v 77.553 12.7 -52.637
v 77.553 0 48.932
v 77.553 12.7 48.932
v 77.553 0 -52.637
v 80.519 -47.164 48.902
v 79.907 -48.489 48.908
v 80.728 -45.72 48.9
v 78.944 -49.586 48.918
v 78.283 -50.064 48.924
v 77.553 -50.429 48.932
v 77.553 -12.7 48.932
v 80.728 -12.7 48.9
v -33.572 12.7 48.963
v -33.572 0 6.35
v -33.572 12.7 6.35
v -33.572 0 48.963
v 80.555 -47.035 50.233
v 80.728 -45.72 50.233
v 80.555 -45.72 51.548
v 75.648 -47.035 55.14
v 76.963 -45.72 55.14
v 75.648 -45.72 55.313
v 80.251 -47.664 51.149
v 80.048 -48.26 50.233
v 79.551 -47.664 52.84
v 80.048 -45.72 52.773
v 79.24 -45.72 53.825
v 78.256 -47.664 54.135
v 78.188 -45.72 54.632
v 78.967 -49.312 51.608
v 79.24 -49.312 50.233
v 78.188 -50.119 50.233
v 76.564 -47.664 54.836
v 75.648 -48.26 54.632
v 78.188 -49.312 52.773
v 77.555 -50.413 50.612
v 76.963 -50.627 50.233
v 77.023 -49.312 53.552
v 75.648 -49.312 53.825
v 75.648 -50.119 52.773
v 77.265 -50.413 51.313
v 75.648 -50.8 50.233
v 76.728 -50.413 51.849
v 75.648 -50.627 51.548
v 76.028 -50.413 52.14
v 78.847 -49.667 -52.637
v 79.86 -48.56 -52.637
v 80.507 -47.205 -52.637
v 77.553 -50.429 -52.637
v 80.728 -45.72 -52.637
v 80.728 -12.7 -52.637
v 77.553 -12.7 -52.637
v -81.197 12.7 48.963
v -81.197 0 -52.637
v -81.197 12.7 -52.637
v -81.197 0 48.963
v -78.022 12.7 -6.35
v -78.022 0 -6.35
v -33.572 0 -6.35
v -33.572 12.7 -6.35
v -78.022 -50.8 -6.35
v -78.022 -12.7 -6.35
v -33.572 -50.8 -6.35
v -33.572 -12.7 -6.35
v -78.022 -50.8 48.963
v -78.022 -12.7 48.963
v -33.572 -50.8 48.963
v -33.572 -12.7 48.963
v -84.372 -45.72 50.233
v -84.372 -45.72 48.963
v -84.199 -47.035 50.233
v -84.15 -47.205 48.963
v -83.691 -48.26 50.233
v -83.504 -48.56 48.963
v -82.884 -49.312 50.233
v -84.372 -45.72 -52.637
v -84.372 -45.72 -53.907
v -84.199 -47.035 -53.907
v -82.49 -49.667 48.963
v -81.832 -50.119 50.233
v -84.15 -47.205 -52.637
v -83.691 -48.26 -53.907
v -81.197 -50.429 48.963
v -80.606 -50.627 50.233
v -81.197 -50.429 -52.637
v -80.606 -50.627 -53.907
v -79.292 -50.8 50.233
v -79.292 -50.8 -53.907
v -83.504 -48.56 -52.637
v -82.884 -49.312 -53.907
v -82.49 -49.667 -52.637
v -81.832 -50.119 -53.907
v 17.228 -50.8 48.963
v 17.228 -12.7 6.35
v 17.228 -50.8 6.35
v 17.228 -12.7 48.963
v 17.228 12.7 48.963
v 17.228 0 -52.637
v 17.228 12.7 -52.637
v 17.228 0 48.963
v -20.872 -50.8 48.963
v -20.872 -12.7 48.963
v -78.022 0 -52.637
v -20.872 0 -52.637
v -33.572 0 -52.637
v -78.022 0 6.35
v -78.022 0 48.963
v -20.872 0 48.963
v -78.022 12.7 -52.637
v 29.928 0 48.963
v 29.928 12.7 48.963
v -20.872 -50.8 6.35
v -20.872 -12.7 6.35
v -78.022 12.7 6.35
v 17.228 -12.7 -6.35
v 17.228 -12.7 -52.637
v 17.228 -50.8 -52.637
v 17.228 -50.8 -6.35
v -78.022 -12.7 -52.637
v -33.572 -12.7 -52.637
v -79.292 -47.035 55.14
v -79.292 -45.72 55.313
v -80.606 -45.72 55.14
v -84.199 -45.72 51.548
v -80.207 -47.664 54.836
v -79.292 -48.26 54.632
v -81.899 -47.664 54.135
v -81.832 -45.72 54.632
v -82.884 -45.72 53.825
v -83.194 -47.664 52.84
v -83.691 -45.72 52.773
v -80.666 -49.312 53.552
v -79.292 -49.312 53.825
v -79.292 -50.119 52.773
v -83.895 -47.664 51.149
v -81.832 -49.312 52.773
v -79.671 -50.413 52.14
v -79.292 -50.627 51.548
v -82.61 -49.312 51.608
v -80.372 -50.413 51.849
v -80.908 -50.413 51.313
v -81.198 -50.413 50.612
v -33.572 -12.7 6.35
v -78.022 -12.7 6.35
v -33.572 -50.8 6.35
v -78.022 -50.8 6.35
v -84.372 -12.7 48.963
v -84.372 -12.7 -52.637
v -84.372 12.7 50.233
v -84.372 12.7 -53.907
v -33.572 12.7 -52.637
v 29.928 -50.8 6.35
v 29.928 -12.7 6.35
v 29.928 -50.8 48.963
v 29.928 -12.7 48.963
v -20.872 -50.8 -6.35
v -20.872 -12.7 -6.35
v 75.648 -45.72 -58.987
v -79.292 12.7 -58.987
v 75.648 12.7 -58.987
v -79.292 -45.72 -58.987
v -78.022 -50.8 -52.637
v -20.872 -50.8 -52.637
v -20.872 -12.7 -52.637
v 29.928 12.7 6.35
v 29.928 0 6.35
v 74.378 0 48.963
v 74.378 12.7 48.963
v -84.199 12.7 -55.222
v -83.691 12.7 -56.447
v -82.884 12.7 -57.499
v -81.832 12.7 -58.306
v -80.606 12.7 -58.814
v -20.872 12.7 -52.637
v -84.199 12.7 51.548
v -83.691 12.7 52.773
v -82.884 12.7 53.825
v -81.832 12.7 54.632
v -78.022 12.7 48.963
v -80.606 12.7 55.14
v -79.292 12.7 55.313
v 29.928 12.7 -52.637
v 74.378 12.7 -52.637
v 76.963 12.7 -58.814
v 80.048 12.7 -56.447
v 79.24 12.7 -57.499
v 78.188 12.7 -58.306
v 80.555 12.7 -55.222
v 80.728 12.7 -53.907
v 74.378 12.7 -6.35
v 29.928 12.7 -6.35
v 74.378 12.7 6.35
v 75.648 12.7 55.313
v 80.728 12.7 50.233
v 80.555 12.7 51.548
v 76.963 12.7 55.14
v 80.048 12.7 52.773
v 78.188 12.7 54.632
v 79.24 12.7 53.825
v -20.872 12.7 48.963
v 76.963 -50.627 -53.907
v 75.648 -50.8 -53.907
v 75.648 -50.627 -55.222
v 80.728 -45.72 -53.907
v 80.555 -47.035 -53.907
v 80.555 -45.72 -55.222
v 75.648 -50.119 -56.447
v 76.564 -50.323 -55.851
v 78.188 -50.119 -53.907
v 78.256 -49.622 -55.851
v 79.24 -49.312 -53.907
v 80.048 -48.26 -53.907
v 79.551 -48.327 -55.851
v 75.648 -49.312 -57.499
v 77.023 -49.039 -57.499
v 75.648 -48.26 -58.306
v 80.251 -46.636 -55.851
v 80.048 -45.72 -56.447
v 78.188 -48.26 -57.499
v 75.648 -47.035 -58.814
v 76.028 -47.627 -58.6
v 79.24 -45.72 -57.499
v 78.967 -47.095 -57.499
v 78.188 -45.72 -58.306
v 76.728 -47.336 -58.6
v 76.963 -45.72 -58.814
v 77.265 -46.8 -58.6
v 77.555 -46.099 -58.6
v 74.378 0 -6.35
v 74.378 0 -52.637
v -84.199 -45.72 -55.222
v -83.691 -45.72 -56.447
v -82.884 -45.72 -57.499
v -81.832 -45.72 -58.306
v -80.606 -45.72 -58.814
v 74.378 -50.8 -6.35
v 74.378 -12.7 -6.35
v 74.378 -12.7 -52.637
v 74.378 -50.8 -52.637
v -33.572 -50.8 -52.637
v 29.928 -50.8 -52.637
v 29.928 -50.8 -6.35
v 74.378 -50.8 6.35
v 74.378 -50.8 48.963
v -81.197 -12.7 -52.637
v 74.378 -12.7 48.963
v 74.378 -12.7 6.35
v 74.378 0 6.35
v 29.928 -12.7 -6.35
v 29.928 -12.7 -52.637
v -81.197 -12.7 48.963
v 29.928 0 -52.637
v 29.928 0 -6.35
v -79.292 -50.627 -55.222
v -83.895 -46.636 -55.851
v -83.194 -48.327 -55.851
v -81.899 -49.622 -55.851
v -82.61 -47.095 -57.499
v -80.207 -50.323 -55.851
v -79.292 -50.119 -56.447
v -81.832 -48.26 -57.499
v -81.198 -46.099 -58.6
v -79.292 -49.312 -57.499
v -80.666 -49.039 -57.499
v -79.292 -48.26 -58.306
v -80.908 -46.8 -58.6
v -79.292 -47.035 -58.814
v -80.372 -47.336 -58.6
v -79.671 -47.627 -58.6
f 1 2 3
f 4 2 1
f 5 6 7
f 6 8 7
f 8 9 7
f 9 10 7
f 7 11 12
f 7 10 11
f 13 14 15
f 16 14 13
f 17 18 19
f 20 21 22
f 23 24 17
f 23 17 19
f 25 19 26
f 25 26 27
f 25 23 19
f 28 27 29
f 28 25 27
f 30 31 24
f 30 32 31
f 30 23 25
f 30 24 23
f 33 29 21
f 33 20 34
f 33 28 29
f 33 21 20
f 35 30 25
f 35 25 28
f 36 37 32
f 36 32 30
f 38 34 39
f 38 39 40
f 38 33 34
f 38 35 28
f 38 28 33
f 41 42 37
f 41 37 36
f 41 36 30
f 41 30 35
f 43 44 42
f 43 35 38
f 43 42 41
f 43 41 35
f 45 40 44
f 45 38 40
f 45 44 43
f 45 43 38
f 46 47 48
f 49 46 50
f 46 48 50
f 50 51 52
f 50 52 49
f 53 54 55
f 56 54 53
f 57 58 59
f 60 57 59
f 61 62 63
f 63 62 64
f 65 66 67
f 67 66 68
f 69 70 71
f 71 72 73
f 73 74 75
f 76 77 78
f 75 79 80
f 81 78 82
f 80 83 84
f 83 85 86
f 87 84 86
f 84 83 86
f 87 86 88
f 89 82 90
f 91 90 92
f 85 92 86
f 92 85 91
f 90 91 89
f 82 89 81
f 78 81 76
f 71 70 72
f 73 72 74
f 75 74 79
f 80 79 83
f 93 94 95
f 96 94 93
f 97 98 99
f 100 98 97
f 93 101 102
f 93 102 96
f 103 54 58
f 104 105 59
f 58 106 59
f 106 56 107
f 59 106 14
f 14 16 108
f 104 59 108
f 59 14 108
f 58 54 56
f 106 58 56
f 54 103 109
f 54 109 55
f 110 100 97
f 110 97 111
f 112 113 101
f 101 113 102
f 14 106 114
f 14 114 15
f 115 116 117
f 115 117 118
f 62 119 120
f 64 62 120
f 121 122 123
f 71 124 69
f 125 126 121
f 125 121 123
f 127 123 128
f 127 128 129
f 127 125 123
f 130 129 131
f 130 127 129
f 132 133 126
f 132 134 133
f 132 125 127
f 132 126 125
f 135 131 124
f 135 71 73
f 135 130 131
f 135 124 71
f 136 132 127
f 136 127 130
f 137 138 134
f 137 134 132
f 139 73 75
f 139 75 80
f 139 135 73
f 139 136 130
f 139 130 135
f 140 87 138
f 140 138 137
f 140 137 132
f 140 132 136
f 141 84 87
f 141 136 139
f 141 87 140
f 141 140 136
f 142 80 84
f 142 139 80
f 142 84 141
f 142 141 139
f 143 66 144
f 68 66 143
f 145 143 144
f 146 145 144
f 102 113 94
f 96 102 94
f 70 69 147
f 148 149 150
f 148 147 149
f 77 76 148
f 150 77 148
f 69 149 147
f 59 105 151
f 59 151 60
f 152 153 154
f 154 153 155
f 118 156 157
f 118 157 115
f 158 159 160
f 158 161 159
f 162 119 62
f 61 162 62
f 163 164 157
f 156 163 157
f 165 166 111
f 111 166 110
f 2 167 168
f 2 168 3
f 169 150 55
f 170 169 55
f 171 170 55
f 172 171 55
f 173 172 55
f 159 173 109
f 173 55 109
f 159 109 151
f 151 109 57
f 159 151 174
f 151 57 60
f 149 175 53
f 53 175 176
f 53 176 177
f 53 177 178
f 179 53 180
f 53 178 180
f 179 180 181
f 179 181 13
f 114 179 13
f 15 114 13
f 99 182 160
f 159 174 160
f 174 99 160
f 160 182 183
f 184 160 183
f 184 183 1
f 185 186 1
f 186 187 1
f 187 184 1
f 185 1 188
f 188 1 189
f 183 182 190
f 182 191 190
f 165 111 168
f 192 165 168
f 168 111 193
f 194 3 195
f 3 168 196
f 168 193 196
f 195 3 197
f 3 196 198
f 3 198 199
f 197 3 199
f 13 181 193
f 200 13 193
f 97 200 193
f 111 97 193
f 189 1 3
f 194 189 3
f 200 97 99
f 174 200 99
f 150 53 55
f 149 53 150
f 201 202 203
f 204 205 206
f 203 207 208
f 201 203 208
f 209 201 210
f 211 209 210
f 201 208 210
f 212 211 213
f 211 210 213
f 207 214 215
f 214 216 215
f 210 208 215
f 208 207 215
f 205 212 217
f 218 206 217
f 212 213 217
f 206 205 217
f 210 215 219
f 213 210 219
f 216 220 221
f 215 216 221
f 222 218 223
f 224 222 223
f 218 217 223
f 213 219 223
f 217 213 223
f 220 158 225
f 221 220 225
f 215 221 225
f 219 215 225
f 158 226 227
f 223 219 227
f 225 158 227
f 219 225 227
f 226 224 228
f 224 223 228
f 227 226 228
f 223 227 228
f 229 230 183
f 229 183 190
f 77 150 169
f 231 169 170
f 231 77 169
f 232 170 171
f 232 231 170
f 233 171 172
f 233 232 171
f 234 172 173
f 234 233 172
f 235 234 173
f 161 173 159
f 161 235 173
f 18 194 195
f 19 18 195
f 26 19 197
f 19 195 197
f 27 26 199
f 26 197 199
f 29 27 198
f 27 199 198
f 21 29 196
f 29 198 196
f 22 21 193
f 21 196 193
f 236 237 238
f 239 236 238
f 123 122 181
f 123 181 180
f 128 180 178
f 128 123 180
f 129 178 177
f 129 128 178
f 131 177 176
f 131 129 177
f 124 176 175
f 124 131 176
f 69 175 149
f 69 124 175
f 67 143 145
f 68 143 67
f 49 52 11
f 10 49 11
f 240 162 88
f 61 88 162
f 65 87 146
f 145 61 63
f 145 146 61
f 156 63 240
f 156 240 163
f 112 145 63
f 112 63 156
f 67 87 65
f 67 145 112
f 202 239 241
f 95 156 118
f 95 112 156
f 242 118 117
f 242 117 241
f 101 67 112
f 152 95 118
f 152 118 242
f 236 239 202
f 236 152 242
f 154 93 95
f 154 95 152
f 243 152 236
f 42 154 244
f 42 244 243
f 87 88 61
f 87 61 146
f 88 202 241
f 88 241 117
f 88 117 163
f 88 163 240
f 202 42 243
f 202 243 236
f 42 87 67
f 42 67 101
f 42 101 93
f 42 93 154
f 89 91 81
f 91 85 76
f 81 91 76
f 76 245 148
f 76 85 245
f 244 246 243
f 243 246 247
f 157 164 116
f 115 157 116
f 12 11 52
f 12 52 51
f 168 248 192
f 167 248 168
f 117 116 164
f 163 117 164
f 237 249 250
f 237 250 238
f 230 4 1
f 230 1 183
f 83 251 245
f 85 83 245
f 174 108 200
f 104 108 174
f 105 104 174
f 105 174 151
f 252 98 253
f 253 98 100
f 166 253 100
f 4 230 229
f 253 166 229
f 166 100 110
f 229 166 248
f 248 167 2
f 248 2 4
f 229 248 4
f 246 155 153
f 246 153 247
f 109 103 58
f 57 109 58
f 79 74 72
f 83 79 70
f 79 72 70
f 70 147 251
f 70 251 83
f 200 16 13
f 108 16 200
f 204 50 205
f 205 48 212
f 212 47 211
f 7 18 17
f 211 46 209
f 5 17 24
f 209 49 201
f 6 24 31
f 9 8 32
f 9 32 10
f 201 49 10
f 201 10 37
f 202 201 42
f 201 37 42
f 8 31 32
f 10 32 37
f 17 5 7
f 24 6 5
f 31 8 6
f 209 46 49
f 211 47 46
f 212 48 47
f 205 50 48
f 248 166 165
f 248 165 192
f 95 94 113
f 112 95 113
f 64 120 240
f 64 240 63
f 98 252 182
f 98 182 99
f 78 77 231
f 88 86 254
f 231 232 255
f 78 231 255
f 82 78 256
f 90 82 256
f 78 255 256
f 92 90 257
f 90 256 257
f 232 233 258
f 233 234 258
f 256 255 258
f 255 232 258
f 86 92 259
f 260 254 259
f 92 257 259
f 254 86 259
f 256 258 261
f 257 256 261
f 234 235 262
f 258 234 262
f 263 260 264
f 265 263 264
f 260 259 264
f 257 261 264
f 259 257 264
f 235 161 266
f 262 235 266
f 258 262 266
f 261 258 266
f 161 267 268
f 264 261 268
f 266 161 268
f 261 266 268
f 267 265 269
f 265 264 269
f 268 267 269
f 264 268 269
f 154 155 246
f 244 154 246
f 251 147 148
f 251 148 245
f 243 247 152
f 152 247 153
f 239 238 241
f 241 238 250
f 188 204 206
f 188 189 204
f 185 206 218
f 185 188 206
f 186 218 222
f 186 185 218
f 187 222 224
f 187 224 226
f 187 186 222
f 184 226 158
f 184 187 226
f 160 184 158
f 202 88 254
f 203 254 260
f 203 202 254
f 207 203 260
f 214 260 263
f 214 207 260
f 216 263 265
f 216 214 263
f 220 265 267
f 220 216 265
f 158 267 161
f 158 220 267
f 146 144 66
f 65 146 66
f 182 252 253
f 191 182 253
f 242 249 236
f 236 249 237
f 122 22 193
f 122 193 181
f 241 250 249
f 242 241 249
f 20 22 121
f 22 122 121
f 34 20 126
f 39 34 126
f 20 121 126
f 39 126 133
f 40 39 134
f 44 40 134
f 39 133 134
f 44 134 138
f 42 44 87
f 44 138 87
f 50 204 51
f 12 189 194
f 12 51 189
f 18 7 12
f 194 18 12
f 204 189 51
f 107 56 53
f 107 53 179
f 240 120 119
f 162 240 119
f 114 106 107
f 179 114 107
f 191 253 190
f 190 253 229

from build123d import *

# Parameters (mm, degrees)
F0_W     = 3.175
F0_H     = 6.35
F0_W_2   = 6.35
F0_W_3   = 44.45
F0_W_4   = 15.0601655953
F0_W_5   = 5.811475683
F0_W_6   = 6.888524317
F0_W_7   = 10.3398344047
F0_H_2   = 42.6130002154
F0_H_3   = 46.2869997846
F1_DEPTH = 50.8
F0_H_4   = 52.6369997846
F0_H_5   = 48.9630002154
F2_DEPTH = 12.7
F3_F1_R  = 5.08
F3_F2_R  = 5.08
F3_F3_R  = 5.08
F3_F4_R  = 5.08


with BuildPart() as f1:
    # F0 (on Front) → F1 (new body)
    with BuildSketch(Plane.XZ):
        Polygon((0, -58.9869997846), (0, -52.6369997846), (-5.811475683, -52.6369997846), (-20.8716412783, -52.6369997846), (-27.2216412783, -52.6369997846), (-33.5716412783, -52.6369997846), (-78.0216412783, -52.6369997846), (-78.0216412783, -58.9869997846), align=None)
        with Locations((-79.6091412783, 52.1380002154)):
            Rectangle(F0_W, F0_H)
        with Locations((-82.7841412783, 52.1380002154)):
            Rectangle(F0_W, F0_H)
        Polygon((-5.811475683, 48.9630002154), (0, 48.9630002154), (0, 55.3130002154), (-78.0216412783, 55.3130002154), (-78.0216412783, 48.9630002154), (-33.5716412783, 48.9630002154), (-27.2216412783, 48.9630002154), (-20.8716412783, 48.9630002154), align=None)
        Polygon((0, 55.3130002154), (0, 48.9630002154), (6.888524317, 48.9630002154), (17.2283587217, 48.9630002154), (23.5783587217, 48.9630002154), (29.9283587217, 48.9630002154), (74.3783587217, 48.9630002154), (74.3783587217, 55.3130002154), align=None)
        Polygon((80.7283587217, 55.3130002154), (77.5533587217, 55.3130002154), (77.5533587217, 48.9315246976), (80.7283587217, 48.9000491798), align=None)
        Polygon((77.5533587217, 55.3130002154), (74.3783587217, 55.3130002154), (74.3783587217, 48.9630002154), (77.5533587217, 48.9315246976), align=None)
        Polygon((6.888524317, -52.6369997846), (0, -52.6369997846), (0, -58.9869997846), (80.7283587217, -58.9869997846), (80.7283587217, -52.6369997846), (77.5533587217, -52.6369997846), (74.3783587217, -52.6369997846), (29.9283587217, -52.6369997846), (23.5783587217, -52.6369997846), (17.2283587217, -52.6369997846), align=None)
        with Locations((-82.7841412783, -55.8119997846)):
            Rectangle(F0_W, F0_H)
        with Locations((-79.6091412783, -55.8119997846)):
            Rectangle(F0_W, F0_H)
        with Locations((-30.3966412783, 3.175)):
            Rectangle(F0_W_2, F0_H)
        with Locations((-24.0466412783, 3.175)):
            Rectangle(F0_W_2, F0_H)
        with Locations((-30.3966412783, -3.175)):
            Rectangle(F0_W_2, F0_H)
        with Locations((-24.0466412783, -3.175)):
            Rectangle(F0_W_2, F0_H)
        with Locations((20.4033587217, -3.175)):
            Rectangle(F0_W_2, F0_H)
        with Locations((20.4033587217, 3.175)):
            Rectangle(F0_W_2, F0_H)
        with Locations((26.7533587217, 3.175)):
            Rectangle(F0_W_2, F0_H)
        with Locations((26.7533587217, -3.175)):
            Rectangle(F0_W_2, F0_H)
        with Locations((-55.7966412783, 3.175)):
            Rectangle(F0_W_3, F0_H)
        with Locations((-55.7966412783, -3.175)):
            Rectangle(F0_W_3, F0_H)
        with Locations((-13.3415584806, 3.175)):
            Rectangle(F0_W_4, F0_H)
        with Locations((-13.3415584806, -3.175)):
            Rectangle(F0_W_4, F0_H)
        with Locations((-2.9057378415, 3.175)):
            Rectangle(F0_W_5, F0_H)
        with Locations((-2.9057378415, -3.175)):
            Rectangle(F0_W_5, F0_H)
        with Locations((3.4442621585, -3.175)):
            Rectangle(F0_W_6, F0_H)
        with Locations((3.4442621585, 3.175)):
            Rectangle(F0_W_6, F0_H)
        with Locations((12.0584415194, -3.175)):
            Rectangle(F0_W_7, F0_H)
        with Locations((12.0584415194, 3.175)):
            Rectangle(F0_W_7, F0_H)
        with Locations((52.1533587217, 3.175)):
            Rectangle(F0_W_3, F0_H)
        with Locations((52.1533587217, -3.175)):
            Rectangle(F0_W_3, F0_H)
        with Locations((-30.3966412783, 27.6565001077)):
            Rectangle(F0_W_2, F0_H_2)
        with Locations((-24.0466412783, 27.6565001077)):
            Rectangle(F0_W_2, F0_H_2)
        with Locations((-30.3966412783, -29.4934998923)):
            Rectangle(F0_W_2, F0_H_3)
        with Locations((-24.0466412783, -29.4934998923)):
            Rectangle(F0_W_2, F0_H_3)
        with Locations((20.4033587217, 27.6565001077)):
            Rectangle(F0_W_2, F0_H_2)
        with Locations((26.7533587217, 27.6565001077)):
            Rectangle(F0_W_2, F0_H_2)
        with Locations((20.4033587217, -29.4934998923)):
            Rectangle(F0_W_2, F0_H_3)
        with Locations((26.7533587217, -29.4934998923)):
            Rectangle(F0_W_2, F0_H_3)
        Polygon((77.5533587217, 48.9315246976), (74.3783587217, 48.9630002154), (74.3783587217, 6.35), (74.3783587217, 0), (77.5533587217, 0), align=None)
        Polygon((77.5533587217, 0), (74.3783587217, 0), (74.3783587217, -6.35), (74.3783587217, -52.6369997846), (77.5533587217, -52.6369997846), align=None)
        Polygon((-78.0216412783, 6.35), (-78.0216412783, 48.9630002154), (-81.1966412783, 48.9630002154), (-81.1966412783, 0), (-78.0216412783, 0), align=None)
        Polygon((-81.1966412783, -52.6369997846), (-78.0216412783, -52.6369997846), (-78.0216412783, -6.35), (-78.0216412783, 0), (-81.1966412783, 0), align=None)
    extrude(amount=F1_DEPTH)

    # F0 (on Front) → F2 (join, symmetric)
    with BuildSketch(Plane.XZ):
        with Locations((-2.9057378415, 3.175)):
            Rectangle(F0_W_5, F0_H)
        with Locations((3.4442621585, -3.175)):
            Rectangle(F0_W_6, F0_H)
        with Locations((-2.9057378415, -3.175)):
            Rectangle(F0_W_5, F0_H)
        with Locations((3.4442621585, 3.175)):
            Rectangle(F0_W_6, F0_H)
        with Locations((-2.9057378415, 27.6565001077)):
            Rectangle(F0_W_5, F0_H_2)
        with Locations((3.4442621585, 27.6565001077)):
            Rectangle(F0_W_6, F0_H_2)
        with Locations((3.4442621585, -29.4934998923)):
            Rectangle(F0_W_6, F0_H_3)
        with Locations((-2.9057378415, -29.4934998923)):
            Rectangle(F0_W_5, F0_H_3)
        with Locations((-13.3415584806, -3.175)):
            Rectangle(F0_W_4, F0_H)
        with Locations((-13.3415584806, 3.175)):
            Rectangle(F0_W_4, F0_H)
        with Locations((12.0584415194, 3.175)):
            Rectangle(F0_W_7, F0_H)
        with Locations((12.0584415194, -3.175)):
            Rectangle(F0_W_7, F0_H)
        Polygon((0, 55.3130002154), (0, 48.9630002154), (6.888524317, 48.9630002154), (17.2283587217, 48.9630002154), (23.5783587217, 48.9630002154), (29.9283587217, 48.9630002154), (74.3783587217, 48.9630002154), (74.3783587217, 55.3130002154), align=None)
        Polygon((-5.811475683, 48.9630002154), (0, 48.9630002154), (0, 55.3130002154), (-78.0216412783, 55.3130002154), (-78.0216412783, 48.9630002154), (-33.5716412783, 48.9630002154), (-27.2216412783, 48.9630002154), (-20.8716412783, 48.9630002154), align=None)
        with Locations((12.0584415194, 27.6565001077)):
            Rectangle(F0_W_7, F0_H_2)
        with Locations((-13.3415584806, 27.6565001077)):
            Rectangle(F0_W_4, F0_H_2)
        Polygon((0, -58.9869997846), (0, -52.6369997846), (-5.811475683, -52.6369997846), (-20.8716412783, -52.6369997846), (-27.2216412783, -52.6369997846), (-33.5716412783, -52.6369997846), (-78.0216412783, -52.6369997846), (-78.0216412783, -58.9869997846), align=None)
        Polygon((6.888524317, -52.6369997846), (0, -52.6369997846), (0, -58.9869997846), (80.7283587217, -58.9869997846), (80.7283587217, -52.6369997846), (77.5533587217, -52.6369997846), (74.3783587217, -52.6369997846), (29.9283587217, -52.6369997846), (23.5783587217, -52.6369997846), (17.2283587217, -52.6369997846), align=None)
        with Locations((12.0584415194, -29.4934998923)):
            Rectangle(F0_W_7, F0_H_3)
        with Locations((-13.3415584806, -29.4934998923)):
            Rectangle(F0_W_4, F0_H_3)
        with Locations((-79.6091412783, 52.1380002154)):
            Rectangle(F0_W, F0_H)
        Polygon((77.5533587217, 55.3130002154), (74.3783587217, 55.3130002154), (74.3783587217, 48.9630002154), (77.5533587217, 48.9315246976), align=None)
        with Locations((-79.6091412783, -55.8119997846)):
            Rectangle(F0_W, F0_H)
        with Locations((-55.7966412783, 27.6565001077)):
            Rectangle(F0_W_3, F0_H_2)
        with Locations((-82.7841412783, 52.1380002154)):
            Rectangle(F0_W, F0_H)
        with Locations((52.1533587217, 27.6565001077)):
            Rectangle(F0_W_3, F0_H_2)
        Polygon((80.7283587217, 55.3130002154), (77.5533587217, 55.3130002154), (77.5533587217, 48.9315246976), (80.7283587217, 48.9000491798), align=None)
        with Locations((79.1408587217, -26.3184998923)):
            Rectangle(F0_W, F0_H_4)
        with Locations((-55.7966412783, -29.4934998923)):
            Rectangle(F0_W_3, F0_H_3)
        with Locations((-82.7841412783, -55.8119997846)):
            Rectangle(F0_W, F0_H)
        with Locations((52.1533587217, -29.4934998923)):
            Rectangle(F0_W_3, F0_H_3)
        with Locations((-82.7841412783, 24.4815001077)):
            Rectangle(F0_W, F0_H_5)
        Polygon((80.7283587217, 48.9000491798), (77.5533587217, 48.9315246976), (77.5533587217, 0), (80.7283587217, 0), align=None)
        with Locations((-82.7841412783, -26.3184998923)):
            Rectangle(F0_W, F0_H_4)
    extrude(amount=F2_DEPTH, both=True)

    # F3: fillet of radius 5.08 on 10 edges, made by hand

    # F3_f1
    f3_f1_edges = [f1.edges().sort_by_distance(p)[0] for p in [
        (80.7283587217, -19.05, 55.3130002154),
    ]]
    fillet(f3_f1_edges, radius=F3_F1_R)

    # F3_f2
    f3_f2_edges = [f1.edges().sort_by_distance(p)[0] for p in [
        (-84.3716412783, -19.05, 55.3130002154),
    ]]
    fillet(f3_f2_edges, radius=F3_F2_R)

    # F3_f3
    f3_f3_edges = [f1.edges().sort_by_distance(p)[0] for p in [
        (-1.8216412783, -50.8, 55.3130002154),
    ]]
    fillet(f3_f3_edges, radius=F3_F3_R)

    # F3_f4
    f3_f4_edges = [f1.edges().sort_by_distance(p)[0] for p in [
        (-1.8216412783, -50.8, -58.9869997846),
    ]]
    fillet(f3_f4_edges, radius=F3_F4_R)


solid = f1.part
